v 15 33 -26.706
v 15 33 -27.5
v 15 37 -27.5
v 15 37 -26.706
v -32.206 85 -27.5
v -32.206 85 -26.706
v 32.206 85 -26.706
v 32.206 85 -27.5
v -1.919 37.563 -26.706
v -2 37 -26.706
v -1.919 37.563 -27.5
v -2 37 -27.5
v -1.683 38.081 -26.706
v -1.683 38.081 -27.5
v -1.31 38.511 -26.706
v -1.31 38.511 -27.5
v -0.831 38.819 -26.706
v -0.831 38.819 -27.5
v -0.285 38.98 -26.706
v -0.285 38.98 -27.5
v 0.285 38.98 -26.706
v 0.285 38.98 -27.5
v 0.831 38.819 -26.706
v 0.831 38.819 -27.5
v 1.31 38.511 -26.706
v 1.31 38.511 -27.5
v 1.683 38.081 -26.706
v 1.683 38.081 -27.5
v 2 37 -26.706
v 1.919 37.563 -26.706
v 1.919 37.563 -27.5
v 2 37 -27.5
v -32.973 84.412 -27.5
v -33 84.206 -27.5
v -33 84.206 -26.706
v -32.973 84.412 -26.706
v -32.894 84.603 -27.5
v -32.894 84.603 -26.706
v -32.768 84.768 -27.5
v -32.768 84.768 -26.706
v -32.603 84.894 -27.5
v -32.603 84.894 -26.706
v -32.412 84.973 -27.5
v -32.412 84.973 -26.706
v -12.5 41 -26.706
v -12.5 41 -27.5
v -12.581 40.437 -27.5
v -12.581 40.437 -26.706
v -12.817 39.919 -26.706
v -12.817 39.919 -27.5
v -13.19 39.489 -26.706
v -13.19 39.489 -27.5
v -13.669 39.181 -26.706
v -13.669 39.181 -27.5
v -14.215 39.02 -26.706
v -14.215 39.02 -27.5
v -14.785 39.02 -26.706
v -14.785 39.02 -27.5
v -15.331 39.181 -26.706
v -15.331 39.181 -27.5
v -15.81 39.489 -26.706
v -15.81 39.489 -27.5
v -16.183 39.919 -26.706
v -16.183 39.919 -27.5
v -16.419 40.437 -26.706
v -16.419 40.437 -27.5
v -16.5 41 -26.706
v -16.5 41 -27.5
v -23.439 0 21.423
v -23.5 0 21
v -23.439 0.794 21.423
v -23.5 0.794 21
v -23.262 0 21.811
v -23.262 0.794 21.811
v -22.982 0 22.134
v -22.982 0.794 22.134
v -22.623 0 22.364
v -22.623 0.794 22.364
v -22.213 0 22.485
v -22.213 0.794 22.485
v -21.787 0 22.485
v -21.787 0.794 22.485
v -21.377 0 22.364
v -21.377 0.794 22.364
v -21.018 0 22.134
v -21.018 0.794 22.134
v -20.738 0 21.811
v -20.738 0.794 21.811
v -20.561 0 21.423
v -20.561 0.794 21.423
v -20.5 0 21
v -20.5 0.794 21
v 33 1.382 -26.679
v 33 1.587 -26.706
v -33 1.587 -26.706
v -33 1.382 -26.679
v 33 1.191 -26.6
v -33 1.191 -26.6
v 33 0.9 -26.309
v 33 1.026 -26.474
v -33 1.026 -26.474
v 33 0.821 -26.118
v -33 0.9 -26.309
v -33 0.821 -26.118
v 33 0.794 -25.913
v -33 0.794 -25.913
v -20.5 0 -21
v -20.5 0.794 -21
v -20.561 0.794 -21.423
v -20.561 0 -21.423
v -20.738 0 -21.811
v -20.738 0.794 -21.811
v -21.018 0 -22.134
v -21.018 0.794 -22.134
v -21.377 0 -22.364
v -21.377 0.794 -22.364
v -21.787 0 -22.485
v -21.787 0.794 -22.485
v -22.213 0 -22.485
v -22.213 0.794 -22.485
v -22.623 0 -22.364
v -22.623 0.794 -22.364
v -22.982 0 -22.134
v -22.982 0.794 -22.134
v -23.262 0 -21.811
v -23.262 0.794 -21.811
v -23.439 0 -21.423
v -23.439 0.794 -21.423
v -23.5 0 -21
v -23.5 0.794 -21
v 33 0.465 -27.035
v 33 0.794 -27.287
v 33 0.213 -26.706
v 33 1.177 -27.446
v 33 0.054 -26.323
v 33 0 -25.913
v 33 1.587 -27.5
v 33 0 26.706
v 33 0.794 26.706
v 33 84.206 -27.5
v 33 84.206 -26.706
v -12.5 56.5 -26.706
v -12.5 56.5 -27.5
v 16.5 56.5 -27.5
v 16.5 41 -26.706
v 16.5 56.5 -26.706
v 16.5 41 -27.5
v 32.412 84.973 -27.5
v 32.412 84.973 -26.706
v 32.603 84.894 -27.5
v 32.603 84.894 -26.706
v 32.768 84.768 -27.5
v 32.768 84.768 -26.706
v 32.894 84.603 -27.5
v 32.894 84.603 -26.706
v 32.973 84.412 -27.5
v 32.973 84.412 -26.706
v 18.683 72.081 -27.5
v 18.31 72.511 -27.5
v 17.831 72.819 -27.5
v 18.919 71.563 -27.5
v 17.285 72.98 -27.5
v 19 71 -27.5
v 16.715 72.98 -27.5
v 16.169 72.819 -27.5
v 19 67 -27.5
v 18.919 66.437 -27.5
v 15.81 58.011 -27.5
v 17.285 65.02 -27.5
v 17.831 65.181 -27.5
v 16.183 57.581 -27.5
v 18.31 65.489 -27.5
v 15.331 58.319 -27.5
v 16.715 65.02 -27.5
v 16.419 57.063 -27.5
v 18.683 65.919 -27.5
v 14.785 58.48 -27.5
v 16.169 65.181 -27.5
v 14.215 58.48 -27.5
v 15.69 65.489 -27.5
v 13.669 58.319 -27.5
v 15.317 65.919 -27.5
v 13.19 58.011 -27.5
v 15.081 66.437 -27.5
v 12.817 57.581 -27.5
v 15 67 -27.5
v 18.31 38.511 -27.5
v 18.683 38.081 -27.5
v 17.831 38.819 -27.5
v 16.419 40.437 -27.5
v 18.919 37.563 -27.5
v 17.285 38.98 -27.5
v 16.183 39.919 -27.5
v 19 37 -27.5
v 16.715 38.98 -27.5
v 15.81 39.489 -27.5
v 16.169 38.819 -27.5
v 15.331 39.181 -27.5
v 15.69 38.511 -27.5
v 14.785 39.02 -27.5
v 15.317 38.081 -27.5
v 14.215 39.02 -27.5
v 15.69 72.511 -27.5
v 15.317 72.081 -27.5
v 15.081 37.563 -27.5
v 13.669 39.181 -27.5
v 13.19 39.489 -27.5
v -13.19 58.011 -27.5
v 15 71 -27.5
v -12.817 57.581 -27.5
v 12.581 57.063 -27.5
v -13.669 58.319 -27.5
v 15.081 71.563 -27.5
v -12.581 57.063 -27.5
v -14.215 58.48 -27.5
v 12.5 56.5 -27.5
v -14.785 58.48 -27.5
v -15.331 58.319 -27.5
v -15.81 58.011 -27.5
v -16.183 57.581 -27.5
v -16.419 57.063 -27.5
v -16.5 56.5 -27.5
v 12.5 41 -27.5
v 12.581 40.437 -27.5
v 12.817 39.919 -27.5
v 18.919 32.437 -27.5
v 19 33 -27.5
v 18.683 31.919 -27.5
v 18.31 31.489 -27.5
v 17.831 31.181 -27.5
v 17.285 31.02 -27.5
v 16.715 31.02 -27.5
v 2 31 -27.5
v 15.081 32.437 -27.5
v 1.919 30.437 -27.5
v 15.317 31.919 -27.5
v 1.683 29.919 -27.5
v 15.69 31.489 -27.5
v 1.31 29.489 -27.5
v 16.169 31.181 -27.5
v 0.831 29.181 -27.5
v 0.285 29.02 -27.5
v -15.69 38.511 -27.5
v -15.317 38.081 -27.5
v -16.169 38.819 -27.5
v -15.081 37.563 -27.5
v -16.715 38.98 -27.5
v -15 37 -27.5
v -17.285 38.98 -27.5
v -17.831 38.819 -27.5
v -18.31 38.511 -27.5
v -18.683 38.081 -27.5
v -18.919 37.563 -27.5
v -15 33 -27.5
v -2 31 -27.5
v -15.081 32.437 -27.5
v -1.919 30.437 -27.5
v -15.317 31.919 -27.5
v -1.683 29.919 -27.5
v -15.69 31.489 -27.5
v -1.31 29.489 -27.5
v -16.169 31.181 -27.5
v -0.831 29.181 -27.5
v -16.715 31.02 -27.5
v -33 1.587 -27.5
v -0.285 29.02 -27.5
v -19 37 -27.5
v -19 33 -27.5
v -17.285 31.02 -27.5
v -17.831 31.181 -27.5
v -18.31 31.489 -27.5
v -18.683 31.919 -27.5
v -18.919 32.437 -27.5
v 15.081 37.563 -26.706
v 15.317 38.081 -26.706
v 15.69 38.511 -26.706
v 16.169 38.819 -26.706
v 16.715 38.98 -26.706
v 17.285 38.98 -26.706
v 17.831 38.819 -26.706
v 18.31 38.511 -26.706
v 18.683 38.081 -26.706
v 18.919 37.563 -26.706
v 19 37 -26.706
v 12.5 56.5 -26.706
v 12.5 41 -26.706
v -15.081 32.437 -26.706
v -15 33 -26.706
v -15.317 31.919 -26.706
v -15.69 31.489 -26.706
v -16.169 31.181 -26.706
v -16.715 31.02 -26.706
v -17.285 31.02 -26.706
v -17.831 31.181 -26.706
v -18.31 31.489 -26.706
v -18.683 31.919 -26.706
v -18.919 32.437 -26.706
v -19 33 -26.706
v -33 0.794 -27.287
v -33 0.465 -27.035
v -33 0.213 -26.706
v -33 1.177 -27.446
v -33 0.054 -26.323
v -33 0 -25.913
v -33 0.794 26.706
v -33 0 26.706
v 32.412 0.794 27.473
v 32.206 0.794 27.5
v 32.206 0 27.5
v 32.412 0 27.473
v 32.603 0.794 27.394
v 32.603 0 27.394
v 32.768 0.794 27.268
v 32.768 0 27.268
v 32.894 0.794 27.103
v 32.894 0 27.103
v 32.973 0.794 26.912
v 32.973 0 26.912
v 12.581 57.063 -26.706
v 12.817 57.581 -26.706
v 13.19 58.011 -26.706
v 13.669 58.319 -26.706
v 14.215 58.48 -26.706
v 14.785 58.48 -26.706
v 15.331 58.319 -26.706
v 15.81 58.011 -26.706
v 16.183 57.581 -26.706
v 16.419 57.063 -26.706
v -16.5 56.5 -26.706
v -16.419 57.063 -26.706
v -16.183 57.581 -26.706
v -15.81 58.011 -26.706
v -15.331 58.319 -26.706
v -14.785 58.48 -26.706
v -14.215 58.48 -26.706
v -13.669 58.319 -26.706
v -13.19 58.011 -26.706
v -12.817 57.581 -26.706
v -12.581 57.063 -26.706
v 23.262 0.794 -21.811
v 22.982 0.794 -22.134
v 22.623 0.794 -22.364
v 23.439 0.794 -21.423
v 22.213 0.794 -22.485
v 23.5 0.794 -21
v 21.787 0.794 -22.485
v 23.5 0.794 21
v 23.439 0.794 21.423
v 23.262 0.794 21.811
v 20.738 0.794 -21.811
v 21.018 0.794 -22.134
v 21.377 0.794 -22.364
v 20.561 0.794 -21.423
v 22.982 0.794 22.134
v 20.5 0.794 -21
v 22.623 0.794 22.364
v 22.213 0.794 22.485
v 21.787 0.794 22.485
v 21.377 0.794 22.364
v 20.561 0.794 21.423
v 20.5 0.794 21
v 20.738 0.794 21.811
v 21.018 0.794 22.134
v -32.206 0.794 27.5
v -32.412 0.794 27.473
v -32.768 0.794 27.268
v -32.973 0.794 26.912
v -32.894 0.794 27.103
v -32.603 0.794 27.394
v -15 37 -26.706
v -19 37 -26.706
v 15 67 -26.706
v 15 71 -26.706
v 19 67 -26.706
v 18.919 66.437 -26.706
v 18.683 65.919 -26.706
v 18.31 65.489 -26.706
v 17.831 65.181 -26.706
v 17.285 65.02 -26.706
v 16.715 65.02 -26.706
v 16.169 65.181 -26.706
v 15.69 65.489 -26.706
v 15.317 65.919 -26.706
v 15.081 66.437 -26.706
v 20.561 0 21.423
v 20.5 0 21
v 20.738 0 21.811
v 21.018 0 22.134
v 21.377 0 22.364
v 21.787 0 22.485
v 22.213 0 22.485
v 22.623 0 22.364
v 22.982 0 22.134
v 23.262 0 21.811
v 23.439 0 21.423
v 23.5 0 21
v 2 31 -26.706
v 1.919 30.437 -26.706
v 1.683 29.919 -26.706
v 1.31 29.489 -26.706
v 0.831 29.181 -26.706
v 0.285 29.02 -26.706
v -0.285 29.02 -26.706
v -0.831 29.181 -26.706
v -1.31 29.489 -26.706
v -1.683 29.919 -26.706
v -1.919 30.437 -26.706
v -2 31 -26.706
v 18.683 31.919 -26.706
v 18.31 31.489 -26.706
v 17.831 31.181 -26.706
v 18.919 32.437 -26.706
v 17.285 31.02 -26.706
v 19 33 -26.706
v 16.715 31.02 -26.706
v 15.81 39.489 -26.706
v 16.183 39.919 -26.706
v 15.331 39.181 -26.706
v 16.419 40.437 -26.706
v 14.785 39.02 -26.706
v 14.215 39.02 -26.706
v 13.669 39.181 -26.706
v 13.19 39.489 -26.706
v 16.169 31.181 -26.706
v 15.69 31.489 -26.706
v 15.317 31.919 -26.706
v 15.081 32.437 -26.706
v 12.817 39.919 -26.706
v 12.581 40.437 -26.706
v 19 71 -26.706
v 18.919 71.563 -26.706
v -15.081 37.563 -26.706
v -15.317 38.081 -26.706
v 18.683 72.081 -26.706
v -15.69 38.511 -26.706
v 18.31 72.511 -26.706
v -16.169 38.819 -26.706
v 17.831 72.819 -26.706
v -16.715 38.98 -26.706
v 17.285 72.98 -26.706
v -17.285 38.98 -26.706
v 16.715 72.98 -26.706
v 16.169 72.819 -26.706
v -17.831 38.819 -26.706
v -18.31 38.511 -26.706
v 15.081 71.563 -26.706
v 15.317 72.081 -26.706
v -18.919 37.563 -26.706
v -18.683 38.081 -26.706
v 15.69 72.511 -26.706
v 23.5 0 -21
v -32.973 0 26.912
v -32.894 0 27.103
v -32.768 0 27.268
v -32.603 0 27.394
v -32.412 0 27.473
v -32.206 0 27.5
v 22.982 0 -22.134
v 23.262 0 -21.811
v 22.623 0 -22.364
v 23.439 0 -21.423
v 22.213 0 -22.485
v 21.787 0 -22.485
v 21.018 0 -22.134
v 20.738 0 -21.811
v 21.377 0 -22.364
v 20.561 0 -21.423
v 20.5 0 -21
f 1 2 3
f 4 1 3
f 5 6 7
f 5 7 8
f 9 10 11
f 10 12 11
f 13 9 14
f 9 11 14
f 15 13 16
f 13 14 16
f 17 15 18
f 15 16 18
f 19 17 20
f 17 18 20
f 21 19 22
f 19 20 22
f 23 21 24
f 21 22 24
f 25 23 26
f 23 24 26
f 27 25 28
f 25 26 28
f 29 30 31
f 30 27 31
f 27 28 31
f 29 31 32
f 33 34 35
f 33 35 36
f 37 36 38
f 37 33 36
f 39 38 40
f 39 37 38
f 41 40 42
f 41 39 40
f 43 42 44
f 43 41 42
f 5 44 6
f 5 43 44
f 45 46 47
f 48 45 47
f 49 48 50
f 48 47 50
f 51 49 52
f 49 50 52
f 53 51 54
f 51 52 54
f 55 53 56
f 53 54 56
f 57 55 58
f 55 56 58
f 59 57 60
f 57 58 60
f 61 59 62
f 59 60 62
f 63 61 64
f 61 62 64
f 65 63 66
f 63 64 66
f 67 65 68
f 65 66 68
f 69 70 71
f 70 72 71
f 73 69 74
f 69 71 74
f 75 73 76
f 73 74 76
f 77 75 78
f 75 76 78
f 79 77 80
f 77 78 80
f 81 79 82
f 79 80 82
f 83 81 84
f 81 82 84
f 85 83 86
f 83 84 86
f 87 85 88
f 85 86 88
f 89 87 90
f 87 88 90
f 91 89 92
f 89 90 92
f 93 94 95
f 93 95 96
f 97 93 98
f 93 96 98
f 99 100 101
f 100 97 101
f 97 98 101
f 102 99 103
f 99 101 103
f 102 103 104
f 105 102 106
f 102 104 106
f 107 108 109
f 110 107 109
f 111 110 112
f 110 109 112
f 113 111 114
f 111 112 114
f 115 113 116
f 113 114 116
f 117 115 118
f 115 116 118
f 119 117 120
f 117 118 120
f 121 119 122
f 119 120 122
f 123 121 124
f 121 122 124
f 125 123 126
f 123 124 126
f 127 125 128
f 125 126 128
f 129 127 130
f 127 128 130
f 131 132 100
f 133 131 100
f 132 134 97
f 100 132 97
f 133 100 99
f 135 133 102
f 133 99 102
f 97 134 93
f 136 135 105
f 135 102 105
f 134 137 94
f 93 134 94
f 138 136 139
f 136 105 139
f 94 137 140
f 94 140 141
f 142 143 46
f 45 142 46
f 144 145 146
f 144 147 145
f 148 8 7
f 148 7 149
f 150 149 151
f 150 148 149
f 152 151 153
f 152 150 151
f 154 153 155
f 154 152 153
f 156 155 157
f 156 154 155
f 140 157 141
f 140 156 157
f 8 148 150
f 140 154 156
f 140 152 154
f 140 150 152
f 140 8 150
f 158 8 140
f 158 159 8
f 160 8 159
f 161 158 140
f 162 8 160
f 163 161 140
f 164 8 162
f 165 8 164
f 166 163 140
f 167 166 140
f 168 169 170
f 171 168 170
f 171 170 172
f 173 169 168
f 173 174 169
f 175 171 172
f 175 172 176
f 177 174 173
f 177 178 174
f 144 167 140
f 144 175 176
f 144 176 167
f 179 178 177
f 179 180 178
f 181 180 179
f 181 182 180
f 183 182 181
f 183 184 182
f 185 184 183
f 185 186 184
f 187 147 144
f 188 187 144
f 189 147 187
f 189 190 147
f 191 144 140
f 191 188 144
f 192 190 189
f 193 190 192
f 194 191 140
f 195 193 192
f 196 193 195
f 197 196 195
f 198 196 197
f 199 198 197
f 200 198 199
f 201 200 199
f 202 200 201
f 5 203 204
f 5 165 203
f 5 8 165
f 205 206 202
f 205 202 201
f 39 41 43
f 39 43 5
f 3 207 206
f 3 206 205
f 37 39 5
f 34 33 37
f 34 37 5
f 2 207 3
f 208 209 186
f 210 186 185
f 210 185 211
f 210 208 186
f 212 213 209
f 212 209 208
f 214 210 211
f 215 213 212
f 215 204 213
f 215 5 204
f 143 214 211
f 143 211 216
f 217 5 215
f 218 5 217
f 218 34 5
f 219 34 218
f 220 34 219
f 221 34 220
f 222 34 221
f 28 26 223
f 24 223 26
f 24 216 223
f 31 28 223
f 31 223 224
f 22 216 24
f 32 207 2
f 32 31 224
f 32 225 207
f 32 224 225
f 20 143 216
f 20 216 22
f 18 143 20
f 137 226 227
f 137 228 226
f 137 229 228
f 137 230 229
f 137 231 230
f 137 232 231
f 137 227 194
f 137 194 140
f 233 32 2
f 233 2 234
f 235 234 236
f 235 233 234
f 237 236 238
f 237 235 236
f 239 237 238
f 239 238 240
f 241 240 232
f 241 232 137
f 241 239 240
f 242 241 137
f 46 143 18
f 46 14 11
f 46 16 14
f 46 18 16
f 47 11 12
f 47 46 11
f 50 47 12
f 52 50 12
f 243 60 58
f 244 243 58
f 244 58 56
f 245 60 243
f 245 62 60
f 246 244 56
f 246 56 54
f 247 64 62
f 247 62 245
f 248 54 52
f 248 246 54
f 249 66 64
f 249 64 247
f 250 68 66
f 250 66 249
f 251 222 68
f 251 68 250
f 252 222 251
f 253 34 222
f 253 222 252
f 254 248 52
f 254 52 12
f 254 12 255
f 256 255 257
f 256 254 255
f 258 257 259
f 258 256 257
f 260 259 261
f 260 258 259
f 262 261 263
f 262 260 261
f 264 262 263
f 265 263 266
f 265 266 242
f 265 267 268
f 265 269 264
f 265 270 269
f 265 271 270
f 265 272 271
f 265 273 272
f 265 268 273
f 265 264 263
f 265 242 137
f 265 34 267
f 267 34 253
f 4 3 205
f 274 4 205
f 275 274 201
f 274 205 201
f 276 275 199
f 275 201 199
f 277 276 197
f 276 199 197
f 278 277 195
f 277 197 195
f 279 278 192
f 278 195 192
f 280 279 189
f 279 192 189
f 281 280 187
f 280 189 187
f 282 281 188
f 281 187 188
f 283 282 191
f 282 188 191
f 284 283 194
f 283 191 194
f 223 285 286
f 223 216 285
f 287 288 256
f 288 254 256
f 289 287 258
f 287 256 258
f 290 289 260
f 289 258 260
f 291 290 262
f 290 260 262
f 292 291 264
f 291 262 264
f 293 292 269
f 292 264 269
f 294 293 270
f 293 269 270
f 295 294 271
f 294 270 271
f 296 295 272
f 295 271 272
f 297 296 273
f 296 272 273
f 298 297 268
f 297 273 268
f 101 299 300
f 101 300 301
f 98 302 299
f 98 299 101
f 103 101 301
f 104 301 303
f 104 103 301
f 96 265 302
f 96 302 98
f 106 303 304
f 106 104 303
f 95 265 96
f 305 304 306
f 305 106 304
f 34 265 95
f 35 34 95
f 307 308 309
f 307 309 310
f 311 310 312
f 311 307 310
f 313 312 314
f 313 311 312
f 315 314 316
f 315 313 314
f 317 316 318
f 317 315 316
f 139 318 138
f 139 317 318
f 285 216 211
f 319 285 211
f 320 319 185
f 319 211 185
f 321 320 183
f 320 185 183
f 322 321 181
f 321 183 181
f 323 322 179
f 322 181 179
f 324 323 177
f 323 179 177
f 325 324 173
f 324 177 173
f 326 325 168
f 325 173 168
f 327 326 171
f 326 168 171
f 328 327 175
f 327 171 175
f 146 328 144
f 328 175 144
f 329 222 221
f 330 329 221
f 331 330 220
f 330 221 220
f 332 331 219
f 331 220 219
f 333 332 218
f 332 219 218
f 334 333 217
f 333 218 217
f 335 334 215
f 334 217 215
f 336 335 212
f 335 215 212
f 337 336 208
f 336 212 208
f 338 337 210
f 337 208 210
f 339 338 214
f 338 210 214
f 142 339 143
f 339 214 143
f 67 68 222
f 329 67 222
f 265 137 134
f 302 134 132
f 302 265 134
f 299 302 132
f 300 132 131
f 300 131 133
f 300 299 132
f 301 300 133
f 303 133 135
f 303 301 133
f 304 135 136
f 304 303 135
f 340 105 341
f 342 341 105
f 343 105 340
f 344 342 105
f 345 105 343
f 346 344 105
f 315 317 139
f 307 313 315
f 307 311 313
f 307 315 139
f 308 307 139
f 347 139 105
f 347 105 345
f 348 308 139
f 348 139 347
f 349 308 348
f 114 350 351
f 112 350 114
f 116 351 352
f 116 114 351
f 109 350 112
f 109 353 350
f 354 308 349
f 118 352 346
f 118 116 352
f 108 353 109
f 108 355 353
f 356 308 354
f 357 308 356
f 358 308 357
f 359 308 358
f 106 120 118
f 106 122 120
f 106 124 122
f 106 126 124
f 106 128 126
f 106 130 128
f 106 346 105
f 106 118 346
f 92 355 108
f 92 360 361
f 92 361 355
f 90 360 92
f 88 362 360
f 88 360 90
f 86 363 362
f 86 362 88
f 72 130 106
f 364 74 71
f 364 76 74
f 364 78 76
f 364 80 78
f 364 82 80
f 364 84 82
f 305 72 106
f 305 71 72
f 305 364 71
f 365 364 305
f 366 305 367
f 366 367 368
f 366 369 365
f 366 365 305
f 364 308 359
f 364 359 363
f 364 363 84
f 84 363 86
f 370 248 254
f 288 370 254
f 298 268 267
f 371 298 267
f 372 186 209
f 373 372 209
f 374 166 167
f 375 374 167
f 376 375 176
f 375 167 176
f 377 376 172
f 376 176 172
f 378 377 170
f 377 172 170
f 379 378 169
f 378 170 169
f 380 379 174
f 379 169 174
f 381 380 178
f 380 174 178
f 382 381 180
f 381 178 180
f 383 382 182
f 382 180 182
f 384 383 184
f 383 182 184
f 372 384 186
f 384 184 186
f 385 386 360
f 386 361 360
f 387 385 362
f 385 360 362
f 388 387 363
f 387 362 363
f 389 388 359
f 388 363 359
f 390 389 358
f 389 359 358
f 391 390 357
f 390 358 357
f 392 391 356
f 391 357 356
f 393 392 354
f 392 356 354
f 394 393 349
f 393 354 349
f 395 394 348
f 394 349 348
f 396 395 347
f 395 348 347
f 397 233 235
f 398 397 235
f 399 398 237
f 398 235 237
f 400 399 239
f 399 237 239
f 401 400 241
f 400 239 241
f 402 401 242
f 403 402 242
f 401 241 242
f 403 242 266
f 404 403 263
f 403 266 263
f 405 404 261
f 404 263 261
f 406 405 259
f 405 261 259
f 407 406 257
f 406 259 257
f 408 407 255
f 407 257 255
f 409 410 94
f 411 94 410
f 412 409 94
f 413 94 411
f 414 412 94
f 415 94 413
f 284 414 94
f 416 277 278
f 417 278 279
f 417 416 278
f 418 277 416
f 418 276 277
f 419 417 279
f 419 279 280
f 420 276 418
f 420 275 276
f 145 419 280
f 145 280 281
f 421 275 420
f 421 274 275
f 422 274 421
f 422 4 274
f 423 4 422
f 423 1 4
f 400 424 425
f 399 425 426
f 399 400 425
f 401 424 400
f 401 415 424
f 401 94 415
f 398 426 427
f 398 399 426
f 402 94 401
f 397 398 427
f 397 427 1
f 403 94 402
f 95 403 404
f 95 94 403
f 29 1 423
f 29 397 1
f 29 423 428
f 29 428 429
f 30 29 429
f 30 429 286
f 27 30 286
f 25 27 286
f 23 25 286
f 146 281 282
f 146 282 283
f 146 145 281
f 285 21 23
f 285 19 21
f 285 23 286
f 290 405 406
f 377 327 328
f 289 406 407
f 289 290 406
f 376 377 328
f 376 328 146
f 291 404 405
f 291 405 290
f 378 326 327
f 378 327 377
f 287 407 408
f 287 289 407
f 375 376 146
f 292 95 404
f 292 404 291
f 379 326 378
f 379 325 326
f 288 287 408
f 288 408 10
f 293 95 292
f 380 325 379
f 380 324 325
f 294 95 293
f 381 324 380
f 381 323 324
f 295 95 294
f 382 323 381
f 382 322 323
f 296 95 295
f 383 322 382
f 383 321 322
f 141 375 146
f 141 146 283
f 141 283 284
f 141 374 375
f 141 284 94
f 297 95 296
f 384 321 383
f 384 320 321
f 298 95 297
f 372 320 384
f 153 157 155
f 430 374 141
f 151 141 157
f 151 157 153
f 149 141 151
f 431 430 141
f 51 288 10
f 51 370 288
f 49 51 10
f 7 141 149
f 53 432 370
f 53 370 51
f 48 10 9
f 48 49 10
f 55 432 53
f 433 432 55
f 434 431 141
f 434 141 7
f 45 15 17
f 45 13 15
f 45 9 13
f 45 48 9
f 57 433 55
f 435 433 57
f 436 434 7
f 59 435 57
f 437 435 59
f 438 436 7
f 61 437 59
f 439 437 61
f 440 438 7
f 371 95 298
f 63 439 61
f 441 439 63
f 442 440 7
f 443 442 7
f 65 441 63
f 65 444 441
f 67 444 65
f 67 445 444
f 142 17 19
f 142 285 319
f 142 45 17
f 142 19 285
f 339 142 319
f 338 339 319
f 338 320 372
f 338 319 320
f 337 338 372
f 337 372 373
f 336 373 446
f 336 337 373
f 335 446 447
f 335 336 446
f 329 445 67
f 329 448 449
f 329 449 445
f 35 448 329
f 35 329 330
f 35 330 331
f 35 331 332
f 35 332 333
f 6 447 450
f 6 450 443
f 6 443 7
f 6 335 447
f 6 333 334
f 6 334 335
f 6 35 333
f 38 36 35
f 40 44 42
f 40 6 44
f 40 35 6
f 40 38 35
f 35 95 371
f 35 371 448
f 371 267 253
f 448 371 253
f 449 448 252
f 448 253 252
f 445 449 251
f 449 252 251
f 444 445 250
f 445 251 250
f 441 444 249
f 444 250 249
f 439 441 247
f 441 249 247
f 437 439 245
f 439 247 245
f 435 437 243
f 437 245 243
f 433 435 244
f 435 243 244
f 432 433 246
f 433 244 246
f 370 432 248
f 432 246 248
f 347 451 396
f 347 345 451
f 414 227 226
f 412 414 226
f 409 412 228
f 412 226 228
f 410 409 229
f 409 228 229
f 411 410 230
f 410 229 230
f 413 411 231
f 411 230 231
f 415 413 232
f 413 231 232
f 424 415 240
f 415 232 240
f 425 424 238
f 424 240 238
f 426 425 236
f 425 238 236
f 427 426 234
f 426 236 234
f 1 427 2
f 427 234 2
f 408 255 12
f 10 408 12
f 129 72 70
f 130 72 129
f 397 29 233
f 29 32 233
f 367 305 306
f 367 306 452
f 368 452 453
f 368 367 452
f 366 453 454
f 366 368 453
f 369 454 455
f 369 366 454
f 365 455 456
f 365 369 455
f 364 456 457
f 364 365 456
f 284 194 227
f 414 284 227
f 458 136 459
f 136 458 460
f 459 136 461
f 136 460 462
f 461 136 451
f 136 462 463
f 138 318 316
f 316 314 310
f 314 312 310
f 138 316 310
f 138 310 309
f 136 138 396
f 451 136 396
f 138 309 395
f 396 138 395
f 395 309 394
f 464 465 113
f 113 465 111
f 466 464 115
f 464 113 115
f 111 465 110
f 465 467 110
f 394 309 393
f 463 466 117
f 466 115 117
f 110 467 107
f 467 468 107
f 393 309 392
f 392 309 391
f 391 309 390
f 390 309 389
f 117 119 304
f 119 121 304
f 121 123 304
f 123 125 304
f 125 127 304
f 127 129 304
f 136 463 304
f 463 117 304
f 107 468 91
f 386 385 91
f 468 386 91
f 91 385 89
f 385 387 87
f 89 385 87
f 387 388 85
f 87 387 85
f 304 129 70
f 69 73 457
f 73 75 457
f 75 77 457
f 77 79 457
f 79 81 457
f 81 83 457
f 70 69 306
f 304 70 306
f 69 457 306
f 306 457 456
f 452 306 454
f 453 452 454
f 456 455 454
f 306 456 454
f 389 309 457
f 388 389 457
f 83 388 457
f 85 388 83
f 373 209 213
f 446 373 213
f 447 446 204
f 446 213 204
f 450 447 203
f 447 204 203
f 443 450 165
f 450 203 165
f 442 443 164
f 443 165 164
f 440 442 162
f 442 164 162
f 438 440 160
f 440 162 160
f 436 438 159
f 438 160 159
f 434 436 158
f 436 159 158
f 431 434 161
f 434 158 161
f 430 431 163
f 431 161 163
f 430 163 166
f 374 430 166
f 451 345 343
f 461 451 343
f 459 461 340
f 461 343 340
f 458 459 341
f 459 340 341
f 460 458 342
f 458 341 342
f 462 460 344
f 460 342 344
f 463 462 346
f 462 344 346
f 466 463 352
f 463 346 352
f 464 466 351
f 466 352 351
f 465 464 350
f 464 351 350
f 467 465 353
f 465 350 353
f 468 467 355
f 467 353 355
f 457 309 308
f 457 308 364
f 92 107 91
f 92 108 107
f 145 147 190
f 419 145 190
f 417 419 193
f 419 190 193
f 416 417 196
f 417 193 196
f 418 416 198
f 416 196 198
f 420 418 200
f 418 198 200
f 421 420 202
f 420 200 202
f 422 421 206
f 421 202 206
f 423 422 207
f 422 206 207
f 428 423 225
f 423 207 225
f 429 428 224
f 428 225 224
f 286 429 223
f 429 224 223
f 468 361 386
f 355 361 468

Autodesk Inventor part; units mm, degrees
ref_plane "YZ Plane" through (0, 0, 0) normal (1, 0, 0) x (0, 1, 0)
ref_plane "XZ Plane" through (0, 0, 0) normal (0, 1, 0) x (-1, 0, 0)
ref_plane "XY Plane" through (0, 0, 0) normal (0, 0, 1) x (1, 0, 0)
sketch "Sketch1" plane through (0, 0, 0) normal (0, 1, 0) x (-1, 0, 0)
  line L0 (33, -27.5) -> (-33, -27.5)
  line L1 (-33, -27.5) -> (-33, 27.5)
  line L2 (-33, 27.5) -> (33, 27.5)
  line L3 (33, 27.5) -> (33, -27.5)
  line L4 (33, -27.5) -> (-33, 27.5) construction
  line L5 (-33, -27.5) -> (33, 27.5) construction
  point P0 (0, 0)
  dimension "d0" = 66
  dimension "d1" = 55
extrude "Plate1" add sketch "Sketch1" along normal blind 0.7937
sketch "Sketch3" plane through (0, 0.7937, 0) normal (0, 1, 0) x (1, 0, 0)
  line L0 (0, 0) -> (-33, 0)
  line L1 (-33, 0) -> (-33, 27.5)
  line L2 (-33, 27.5) -> (0, 27.5)
  line L3 (0, 27.5) -> (0, 0)
  circle A0 centre (-22, 16) radius 1.5
  circle A1 centre (-22, -16) radius 1.5
  circle A2 centre (22, 16) radius 1.5
  circle A3 centre (22, -16) radius 1.5
  line L4 (-22, 11) -> (-22, 21) construction
  line L5 (-20.5, 11) -> (-20.5, 21)
  line L6 (-23.5, 21) -> (-23.5, 11)
  arc A4 (-23.5, 11) -> (-20.5, 11) centre (-22, 11) ccw
  arc A5 (-20.5, 21) -> (-23.5, 21) centre (-22, 21) ccw
  line L7 (20.5, 11) -> (20.5, 21)
  line L8 (23.5, 21) -> (23.5, 11)
  arc A6 (20.5, 11) -> (23.5, 11) centre (22, 11) ccw
  arc A7 (23.5, 21) -> (20.5, 21) centre (22, 21) ccw
  line L9 (-20.5, -11) -> (-20.5, -21)
  line L10 (-23.5, -21) -> (-23.5, -11)
  arc A8 (-20.5, -11) -> (-23.5, -11) centre (-22, -11) ccw
  arc A9 (-23.5, -21) -> (-20.5, -21) centre (-22, -21) ccw
  arc A10 (20.5, -21) -> (23.5, -21) centre (22, -21) ccw
  line L11 (23.5, -21) -> (23.5, -11)
  line L12 (20.5, -11) -> (20.5, -21)
  arc A11 (23.5, -11) -> (20.5, -11) centre (22, -11) ccw
  line L13 (-23.5, 16) -> (-20.5, 16)
  line L14 (-20.5, 16) -> (-20.5, -16)
  line L15 (-20.5, -16) -> (-23.5, -16)
  line L16 (-23.5, -16) -> (-23.5, 16)
  line L17 (20.5, -16) -> (23.5, -16)
  line L18 (23.5, -16) -> (23.5, 16)
  line L19 (23.5, 16) -> (20.5, 16)
  line L20 (20.5, 16) -> (20.5, -16)
  dimension "d22" = 3
  dimension "d23" = 32
  dimension "d24" = 22
  dimension "d48" = 5
  dimension "d49" = 3
extrude "Cut1" cut sketch "Sketch3" against normal blind 0.7937 contours L14 A8 L16 L0 | L0 L16 A4 L14 | A4 L6 A0 L5 | L9 A1 L10 A8 | L13 A0 | A0 L6 A5 L5 | A0 L13 | L15 A1 | L9 A9 L10 A1 | A1 L15 | L19 A2 | L8 A6 L7 A2 | A2 L7 A7 L8 | A2 L19 | L18 A11 L20 A6 | L11 A3 L12 A11 | L17 A3 | L11 A10 L12 A3 | A3 L17
sketch "Sketch2" plane through (-33, 0, -26.7063) normal (0, 0, -1) x (-1, 0, 0)
  line L0 (-66, 0) -> (0, 0)
  line L1 (0, 0) -> (0, 85)
  line L2 (0, 85) -> (-66, 85)
  line L3 (-66, 85) -> (-66, 0)
edge flange "Flange1" height 70 angle 90 thickness 0.7937 bend radius 0.7937 thickness toward (0, 0, -1) relief tear relief width 0.7937 relief depth 0.3969 edges at (0, 0.7937, -27.5) wall of the first edge with corners at (33, 0, -26.7063) (-33, 0, -26.7063) (-33, 85, -26.7063) (33, 85, -26.7063)
bend "Bend1"
corner "Corner1"
sketch "Sketch4" plane through (33, 85, -27.5) normal (0, 0, -1) x (-1, 0, 0)
  line L0 (0, -83.4125) -> (66, -83.4125) projected
  line L1 (66, 0) -> (66, -83.4125) projected
  line L2 (0, 0) -> (66, 0) projected
  line L3 (33, -54) -> (33, -48) construction
  line L4 (35, -54) -> (35, -48)
  line L5 (31, -48) -> (31, -54)
  arc A0 (31, -54) -> (35, -54) centre (33, -54) ccw
  arc A1 (35, -48) -> (31, -48) centre (33, -48) ccw
  line L6 (33, -83.4125) -> (33, 0)
  line L7 (47.5, -44) -> (47.5, -28.5) construction
  line L8 (49.5, -44) -> (49.5, -28.5)
  line L9 (45.5, -28.5) -> (45.5, -44)
  arc A2 (45.5, -44) -> (49.5, -44) centre (47.5, -44) ccw
  arc A3 (49.5, -28.5) -> (45.5, -28.5) centre (47.5, -28.5) ccw
  line L10 (18.5, -44) -> (18.5, -28.5) construction
  line L11 (16.5, -44) -> (16.5, -28.5)
  line L12 (20.5, -28.5) -> (20.5, -44)
  arc A4 (16.5, -44) -> (20.5, -44) centre (18.5, -44) ccw
  arc A5 (20.5, -28.5) -> (16.5, -28.5) centre (18.5, -28.5) ccw
  line L13 (66, -85) -> (0, -85) projected
  line L14 (16, -50) -> (50, -50)
  line L15 (50, -50) -> (50, -16)
  line L16 (50, -16) -> (16, -16)
  line L17 (16, -16) -> (16, -50)
  circle A6 centre (16, -16) radius 2
  circle A7 centre (16, -50) radius 2
  circle A8 centre (50, -50) radius 2
  line L18 (33, -16) -> (33, -50)
  line L19 (16, -18) -> (16, -14) construction
  line L20 (18, -18) -> (18, -14)
  line L21 (14, -14) -> (14, -18)
  arc A9 (14, -18) -> (18, -18) centre (16, -18) ccw
  arc A10 (18, -14) -> (14, -14) centre (16, -14) ccw
  line L22 (16, -52) -> (16, -48) construction
  line L23 (18, -52) -> (18, -48)
  line L24 (14, -48) -> (14, -52)
  arc A11 (14, -52) -> (18, -52) centre (16, -52) ccw
  arc A12 (18, -48) -> (14, -48) centre (16, -48) ccw
  line L25 (50, -52) -> (50, -48) construction
  line L26 (52, -52) -> (52, -48)
  line L27 (48, -48) -> (48, -52)
  arc A13 (48, -52) -> (52, -52) centre (50, -52) ccw
  arc A14 (52, -48) -> (48, -48) centre (50, -48) ccw
  point P0 (33, -85)
  point P1 (33, -51)
  point P2 (47.5, -36.25)
  point P3 (18.5, -36.25)
  dimension "d25" = 3
  dimension "d26" = 4
  dimension "d29" = 4
  dimension "d30" = 15.5
  dimension "d31" = 14.5
  dimension "d46" = 48.75
  dimension "d47" = 34
  dimension "d50" = 34
  dimension "d51" = 34
  dimension "d52" = 4
  dimension "d53" = 4
  dimension "d54" = 4
  dimension "d55" = 35
  dimension "d56" = 0
  dimension "d57" = 2
  dimension "d58" = 4
  dimension "d59" = 2
  dimension "d60" = 4
  dimension "d61" = 2
  dimension "d62" = 4
extrude "Cut2" cut sketch "Sketch4" against normal blind 0.7937 contours L6 L14 L4 A0 | A0 L5 L14 L6 | L14 L5 A1 L6 | L6 A1 L4 L14 | A7 L17 L14 | L14 L17 A7 | L23 A11 L24 A7 | A7 L17 A12 L23 | A8 L15 L14 | L27 A14 L15 A8 | L14 L15 A8 | A8 L26 A13 L27 | A6 L17 L16 | L16 L17 A6 | L20 A9 L17 A6 | A6 L21 A10 L20 | A7 L24 A12 L17 | L15 A14 L26 A8 | A6 L17 A9 L21 | A2 L9 A3 L8 | L11 A5 L12 A4
fillet "Corner Round1" radius 0.7937 4 edges at (-33, 0.3969, 27.5) (33, 0.3969, 27.5) (33, 85, -27.1031) (-33, 85, -27.1031)
equation "\"d0\" = subframe_x"
equation "\"d1\" = subframe_y"
equation "\"d22\" = m3_diameter"
equation "\"d23\" = 0.4 * frame_y"
equation "\"d24\" = 0.333333 * subframe_x"
equation "\"d49\" = m3_diameter"
equation "\"d20\" = Thickness"
equation "\"d26\" = m4_diameter"
equation "\"d29\" = m4_diameter"
equation "\"d33\" = Thickness"
equation "\"d3\" = BendReliefWidth"
equation "\"d4\" = BendReliefDepth"
equation "\"d5\" = MinimumRemnant"
equation "\"d6\" = BendRadius"
equation "\"d9\" = BendRadius"
equation "\"d11\" = CornerReliefSize"
equation "\"d12\" = GapSize"
equation "\"d13\" = JacobiRadiusSize"
equation "\"BendRadius\" = Thickness"
equation "\"BendReliefWidth\" = Thickness"
equation "\"BendReliefDepth\" = 0.5 * Thickness"
equation "\"CornerReliefSize\" = 4 * Thickness"
equation "\"MinimumRemnant\" = 2 * Thickness"
equation "\"TransitionRadius\" = BendRadius"
equation "\"JacobiRadiusSize\" = BendRadius"
equation "\"GapSize\" = Thickness"
equation "\"sm_thickness\" = 1.5875"
equation "\"very_thick_acrylic\" = 9.45"
equation "\"thick_acrylic\" = 5.88"
equation "\"thin_acrylic\" = 3.15"
equation "\"clear_acrylic\" = 3.15"
equation "\"wood_thickness\" = 6.72"
equation "\"m3_diameter\" = 3"
equation "\"m3_head\" = 6"
equation "\"m4_diameter\" = 4"
equation "\"m5_diameter\" = 5"
equation "\"m5_head\" = 10.3"
equation "\"brass_insert_drill\" = 4"
equation "\"m5_brass_insert_drill\" = 6.7"
equation "\"m3_press_nut_drill\" = 4.5"
equation "\"m5_press_nut_drill\" = 6.5"
equation "\"laser_body_diameter\" = 12"
equation "\"carrier_y\" = 251"
equation "\"carrier_z\" = 12"
equation "\"visor_x\" = 253.925"
equation "\"visor_y\" = 85.6"
equation "\"window_z\" = 332.225"
equation "\"window_y\" = 93.75"
equation "\"window_overlap\" = 48"
equation "\"acrylic_into_frame\" = 5"
equation "\"door_x\" = 251"
equation "\"door_z\" = 332.225"
equation "\"door_overlap\" = 48"
equation "\"linear_bearing_spacing\" = 198"
equation "\"tray_border\" = 25"
equation "\"bed_z\" = 25"
equation "\"crane_x\" = 223"
equation "\"crane_z2\" = 12"
equation "\"switch_spacing\" = 19"
equation "\"frame_top_z\" = 385"
equation "\"frame_bottom_z\" = 275"
equation "\"frame_total_z\" = 661.5875"
equation "\"frame_face_y\" = 45"
equation "\"frame_foot_z\" = 12"
equation "\"frame_screw_from_center\" = 25"
equation "\"laser_y_offset\" = 19.4"
equation "\"laser_diameter\" = 13"
equation "\"laser_z_offset\" = 55"
equation "\"laser_y\" = 15"
equation "\"laser_z\" = 75"
equation "\"laser_gap\" = 1"
equation "\"subframe_x\" = 66"
equation "\"subframe_y\" = 55"
equation "\"galvo_frame_x\" = 66"
equation "\"galvo_frame_z\" = 85"
equation "\"galvo_frame_y_offset\" = 27.5"
equation "\"drawer_x\" = 191.7875"
equation "\"drawer_y\" = 67.5"
equation "\"drawer_support_from_top\" = 48"
equation "\"drawer_screw_from_center\" = 55"
equation "\"nema17_x\" = 43"
equation "\"d2\" = BendRadius"
equation "\"d44\" = galvo_frame_x"
equation "\"al_thickness\" = 1.5875"
equation "\"rivet_diameter\" = 3.3"
equation "\"bend_factor\" = 2.26205"
equation "\"sm_bend\" = 3.591"
equation "\"al_bend\" = 3.591"
equation "\"frame_x\" = 353.375"
equation "\"carrier_z2\" = 25"
equation "\"carrier_y2\" = 76.825"
equation "\"injection_plastic\" = 3.15"
equation "\"handle_d\" = 4.7625"
equation "\"lmk8uu_shaft\" = 15"
equation "\"al2_bend\" = 3.591"
equation "\"al3_bend\" = 3.591"
equation "\"st2_thickness\" = 1.5875"
equation "\"st3_bend\" = 3.591"
equation "\"al1_bend\" = 1.7955"
equation "\"st2_bend\" = 3.591"
equation "\"st1_thickness\" = 0.79375"
equation "\"st3_thickness\" = 1.5875"
equation "\"al1_thickness\" = 0.79375"
equation "\"st1_bend\" = 1.7955"
equation "\"al3_thickness\" = 1.5875"
equation "\"acme_nut_d\" = 19.1"
equation "\"platform_upper_y\" = 46.625"
equation "\"frame_back_z\" = 498.2125"
equation "\"drawer_reservoir_overlap_x\" = 19.20625"
equation "\"acrylic1_thickness\" = 5.88"
equation "\"laserresin\" = 5"
equation "\"platform_fold_x\" = 25"
equation "\"crane_t\" = 1.5875"
equation "\"reservoir_t\" = 0.79375"
equation "\"platform_crane_gap\" = 0.1"
equation "\"al2_thickness\" = 1.5875"
equation "\"laser_holder_z\" = 75"
equation "\"crane_gap\" = 0.1"
equation "\"drawer_gap\" = 0.1"
equation "\"frame_gap\" = 0.1"
equation "\"acrylic3_thickness\" = 3.15"
equation "\"laser_holder_t\" = 0.79375"
equation "\"frame_back_y\" = 53.2125"
equation "\"foot_z\" = 15"
equation "\"drawer_t\" = 0.79375"
equation "\"frame_back_x\" = 268.2125"
equation "\"frame_back_t\" = 0.79375"
equation "\"frame_front_fold\" = 15"
equation "\"acme_nut_upper_d\" = 12.7"
equation "\"platform_t\" = 1.5875"
equation "\"tray_t\" = 5.88"
equation "\"foot_t\" = 0.79375"
equation "\"frame_front_y\" = 55"
equation "\"reservoir_flap_y\" = 20.79375"
equation "\"handle_hole_d\" = 5.0625"
equation "\"acrylic2_thickness\" = 3.15"
equation "\"drawer_fold\" = 15"
equation "\"handle_spacing\" = 50.8"
equation "\"frame_y\" = 80"
equation "\"Thickness\" = 0.79375"
properties part number "subframe" material "Aluminum 6061"
